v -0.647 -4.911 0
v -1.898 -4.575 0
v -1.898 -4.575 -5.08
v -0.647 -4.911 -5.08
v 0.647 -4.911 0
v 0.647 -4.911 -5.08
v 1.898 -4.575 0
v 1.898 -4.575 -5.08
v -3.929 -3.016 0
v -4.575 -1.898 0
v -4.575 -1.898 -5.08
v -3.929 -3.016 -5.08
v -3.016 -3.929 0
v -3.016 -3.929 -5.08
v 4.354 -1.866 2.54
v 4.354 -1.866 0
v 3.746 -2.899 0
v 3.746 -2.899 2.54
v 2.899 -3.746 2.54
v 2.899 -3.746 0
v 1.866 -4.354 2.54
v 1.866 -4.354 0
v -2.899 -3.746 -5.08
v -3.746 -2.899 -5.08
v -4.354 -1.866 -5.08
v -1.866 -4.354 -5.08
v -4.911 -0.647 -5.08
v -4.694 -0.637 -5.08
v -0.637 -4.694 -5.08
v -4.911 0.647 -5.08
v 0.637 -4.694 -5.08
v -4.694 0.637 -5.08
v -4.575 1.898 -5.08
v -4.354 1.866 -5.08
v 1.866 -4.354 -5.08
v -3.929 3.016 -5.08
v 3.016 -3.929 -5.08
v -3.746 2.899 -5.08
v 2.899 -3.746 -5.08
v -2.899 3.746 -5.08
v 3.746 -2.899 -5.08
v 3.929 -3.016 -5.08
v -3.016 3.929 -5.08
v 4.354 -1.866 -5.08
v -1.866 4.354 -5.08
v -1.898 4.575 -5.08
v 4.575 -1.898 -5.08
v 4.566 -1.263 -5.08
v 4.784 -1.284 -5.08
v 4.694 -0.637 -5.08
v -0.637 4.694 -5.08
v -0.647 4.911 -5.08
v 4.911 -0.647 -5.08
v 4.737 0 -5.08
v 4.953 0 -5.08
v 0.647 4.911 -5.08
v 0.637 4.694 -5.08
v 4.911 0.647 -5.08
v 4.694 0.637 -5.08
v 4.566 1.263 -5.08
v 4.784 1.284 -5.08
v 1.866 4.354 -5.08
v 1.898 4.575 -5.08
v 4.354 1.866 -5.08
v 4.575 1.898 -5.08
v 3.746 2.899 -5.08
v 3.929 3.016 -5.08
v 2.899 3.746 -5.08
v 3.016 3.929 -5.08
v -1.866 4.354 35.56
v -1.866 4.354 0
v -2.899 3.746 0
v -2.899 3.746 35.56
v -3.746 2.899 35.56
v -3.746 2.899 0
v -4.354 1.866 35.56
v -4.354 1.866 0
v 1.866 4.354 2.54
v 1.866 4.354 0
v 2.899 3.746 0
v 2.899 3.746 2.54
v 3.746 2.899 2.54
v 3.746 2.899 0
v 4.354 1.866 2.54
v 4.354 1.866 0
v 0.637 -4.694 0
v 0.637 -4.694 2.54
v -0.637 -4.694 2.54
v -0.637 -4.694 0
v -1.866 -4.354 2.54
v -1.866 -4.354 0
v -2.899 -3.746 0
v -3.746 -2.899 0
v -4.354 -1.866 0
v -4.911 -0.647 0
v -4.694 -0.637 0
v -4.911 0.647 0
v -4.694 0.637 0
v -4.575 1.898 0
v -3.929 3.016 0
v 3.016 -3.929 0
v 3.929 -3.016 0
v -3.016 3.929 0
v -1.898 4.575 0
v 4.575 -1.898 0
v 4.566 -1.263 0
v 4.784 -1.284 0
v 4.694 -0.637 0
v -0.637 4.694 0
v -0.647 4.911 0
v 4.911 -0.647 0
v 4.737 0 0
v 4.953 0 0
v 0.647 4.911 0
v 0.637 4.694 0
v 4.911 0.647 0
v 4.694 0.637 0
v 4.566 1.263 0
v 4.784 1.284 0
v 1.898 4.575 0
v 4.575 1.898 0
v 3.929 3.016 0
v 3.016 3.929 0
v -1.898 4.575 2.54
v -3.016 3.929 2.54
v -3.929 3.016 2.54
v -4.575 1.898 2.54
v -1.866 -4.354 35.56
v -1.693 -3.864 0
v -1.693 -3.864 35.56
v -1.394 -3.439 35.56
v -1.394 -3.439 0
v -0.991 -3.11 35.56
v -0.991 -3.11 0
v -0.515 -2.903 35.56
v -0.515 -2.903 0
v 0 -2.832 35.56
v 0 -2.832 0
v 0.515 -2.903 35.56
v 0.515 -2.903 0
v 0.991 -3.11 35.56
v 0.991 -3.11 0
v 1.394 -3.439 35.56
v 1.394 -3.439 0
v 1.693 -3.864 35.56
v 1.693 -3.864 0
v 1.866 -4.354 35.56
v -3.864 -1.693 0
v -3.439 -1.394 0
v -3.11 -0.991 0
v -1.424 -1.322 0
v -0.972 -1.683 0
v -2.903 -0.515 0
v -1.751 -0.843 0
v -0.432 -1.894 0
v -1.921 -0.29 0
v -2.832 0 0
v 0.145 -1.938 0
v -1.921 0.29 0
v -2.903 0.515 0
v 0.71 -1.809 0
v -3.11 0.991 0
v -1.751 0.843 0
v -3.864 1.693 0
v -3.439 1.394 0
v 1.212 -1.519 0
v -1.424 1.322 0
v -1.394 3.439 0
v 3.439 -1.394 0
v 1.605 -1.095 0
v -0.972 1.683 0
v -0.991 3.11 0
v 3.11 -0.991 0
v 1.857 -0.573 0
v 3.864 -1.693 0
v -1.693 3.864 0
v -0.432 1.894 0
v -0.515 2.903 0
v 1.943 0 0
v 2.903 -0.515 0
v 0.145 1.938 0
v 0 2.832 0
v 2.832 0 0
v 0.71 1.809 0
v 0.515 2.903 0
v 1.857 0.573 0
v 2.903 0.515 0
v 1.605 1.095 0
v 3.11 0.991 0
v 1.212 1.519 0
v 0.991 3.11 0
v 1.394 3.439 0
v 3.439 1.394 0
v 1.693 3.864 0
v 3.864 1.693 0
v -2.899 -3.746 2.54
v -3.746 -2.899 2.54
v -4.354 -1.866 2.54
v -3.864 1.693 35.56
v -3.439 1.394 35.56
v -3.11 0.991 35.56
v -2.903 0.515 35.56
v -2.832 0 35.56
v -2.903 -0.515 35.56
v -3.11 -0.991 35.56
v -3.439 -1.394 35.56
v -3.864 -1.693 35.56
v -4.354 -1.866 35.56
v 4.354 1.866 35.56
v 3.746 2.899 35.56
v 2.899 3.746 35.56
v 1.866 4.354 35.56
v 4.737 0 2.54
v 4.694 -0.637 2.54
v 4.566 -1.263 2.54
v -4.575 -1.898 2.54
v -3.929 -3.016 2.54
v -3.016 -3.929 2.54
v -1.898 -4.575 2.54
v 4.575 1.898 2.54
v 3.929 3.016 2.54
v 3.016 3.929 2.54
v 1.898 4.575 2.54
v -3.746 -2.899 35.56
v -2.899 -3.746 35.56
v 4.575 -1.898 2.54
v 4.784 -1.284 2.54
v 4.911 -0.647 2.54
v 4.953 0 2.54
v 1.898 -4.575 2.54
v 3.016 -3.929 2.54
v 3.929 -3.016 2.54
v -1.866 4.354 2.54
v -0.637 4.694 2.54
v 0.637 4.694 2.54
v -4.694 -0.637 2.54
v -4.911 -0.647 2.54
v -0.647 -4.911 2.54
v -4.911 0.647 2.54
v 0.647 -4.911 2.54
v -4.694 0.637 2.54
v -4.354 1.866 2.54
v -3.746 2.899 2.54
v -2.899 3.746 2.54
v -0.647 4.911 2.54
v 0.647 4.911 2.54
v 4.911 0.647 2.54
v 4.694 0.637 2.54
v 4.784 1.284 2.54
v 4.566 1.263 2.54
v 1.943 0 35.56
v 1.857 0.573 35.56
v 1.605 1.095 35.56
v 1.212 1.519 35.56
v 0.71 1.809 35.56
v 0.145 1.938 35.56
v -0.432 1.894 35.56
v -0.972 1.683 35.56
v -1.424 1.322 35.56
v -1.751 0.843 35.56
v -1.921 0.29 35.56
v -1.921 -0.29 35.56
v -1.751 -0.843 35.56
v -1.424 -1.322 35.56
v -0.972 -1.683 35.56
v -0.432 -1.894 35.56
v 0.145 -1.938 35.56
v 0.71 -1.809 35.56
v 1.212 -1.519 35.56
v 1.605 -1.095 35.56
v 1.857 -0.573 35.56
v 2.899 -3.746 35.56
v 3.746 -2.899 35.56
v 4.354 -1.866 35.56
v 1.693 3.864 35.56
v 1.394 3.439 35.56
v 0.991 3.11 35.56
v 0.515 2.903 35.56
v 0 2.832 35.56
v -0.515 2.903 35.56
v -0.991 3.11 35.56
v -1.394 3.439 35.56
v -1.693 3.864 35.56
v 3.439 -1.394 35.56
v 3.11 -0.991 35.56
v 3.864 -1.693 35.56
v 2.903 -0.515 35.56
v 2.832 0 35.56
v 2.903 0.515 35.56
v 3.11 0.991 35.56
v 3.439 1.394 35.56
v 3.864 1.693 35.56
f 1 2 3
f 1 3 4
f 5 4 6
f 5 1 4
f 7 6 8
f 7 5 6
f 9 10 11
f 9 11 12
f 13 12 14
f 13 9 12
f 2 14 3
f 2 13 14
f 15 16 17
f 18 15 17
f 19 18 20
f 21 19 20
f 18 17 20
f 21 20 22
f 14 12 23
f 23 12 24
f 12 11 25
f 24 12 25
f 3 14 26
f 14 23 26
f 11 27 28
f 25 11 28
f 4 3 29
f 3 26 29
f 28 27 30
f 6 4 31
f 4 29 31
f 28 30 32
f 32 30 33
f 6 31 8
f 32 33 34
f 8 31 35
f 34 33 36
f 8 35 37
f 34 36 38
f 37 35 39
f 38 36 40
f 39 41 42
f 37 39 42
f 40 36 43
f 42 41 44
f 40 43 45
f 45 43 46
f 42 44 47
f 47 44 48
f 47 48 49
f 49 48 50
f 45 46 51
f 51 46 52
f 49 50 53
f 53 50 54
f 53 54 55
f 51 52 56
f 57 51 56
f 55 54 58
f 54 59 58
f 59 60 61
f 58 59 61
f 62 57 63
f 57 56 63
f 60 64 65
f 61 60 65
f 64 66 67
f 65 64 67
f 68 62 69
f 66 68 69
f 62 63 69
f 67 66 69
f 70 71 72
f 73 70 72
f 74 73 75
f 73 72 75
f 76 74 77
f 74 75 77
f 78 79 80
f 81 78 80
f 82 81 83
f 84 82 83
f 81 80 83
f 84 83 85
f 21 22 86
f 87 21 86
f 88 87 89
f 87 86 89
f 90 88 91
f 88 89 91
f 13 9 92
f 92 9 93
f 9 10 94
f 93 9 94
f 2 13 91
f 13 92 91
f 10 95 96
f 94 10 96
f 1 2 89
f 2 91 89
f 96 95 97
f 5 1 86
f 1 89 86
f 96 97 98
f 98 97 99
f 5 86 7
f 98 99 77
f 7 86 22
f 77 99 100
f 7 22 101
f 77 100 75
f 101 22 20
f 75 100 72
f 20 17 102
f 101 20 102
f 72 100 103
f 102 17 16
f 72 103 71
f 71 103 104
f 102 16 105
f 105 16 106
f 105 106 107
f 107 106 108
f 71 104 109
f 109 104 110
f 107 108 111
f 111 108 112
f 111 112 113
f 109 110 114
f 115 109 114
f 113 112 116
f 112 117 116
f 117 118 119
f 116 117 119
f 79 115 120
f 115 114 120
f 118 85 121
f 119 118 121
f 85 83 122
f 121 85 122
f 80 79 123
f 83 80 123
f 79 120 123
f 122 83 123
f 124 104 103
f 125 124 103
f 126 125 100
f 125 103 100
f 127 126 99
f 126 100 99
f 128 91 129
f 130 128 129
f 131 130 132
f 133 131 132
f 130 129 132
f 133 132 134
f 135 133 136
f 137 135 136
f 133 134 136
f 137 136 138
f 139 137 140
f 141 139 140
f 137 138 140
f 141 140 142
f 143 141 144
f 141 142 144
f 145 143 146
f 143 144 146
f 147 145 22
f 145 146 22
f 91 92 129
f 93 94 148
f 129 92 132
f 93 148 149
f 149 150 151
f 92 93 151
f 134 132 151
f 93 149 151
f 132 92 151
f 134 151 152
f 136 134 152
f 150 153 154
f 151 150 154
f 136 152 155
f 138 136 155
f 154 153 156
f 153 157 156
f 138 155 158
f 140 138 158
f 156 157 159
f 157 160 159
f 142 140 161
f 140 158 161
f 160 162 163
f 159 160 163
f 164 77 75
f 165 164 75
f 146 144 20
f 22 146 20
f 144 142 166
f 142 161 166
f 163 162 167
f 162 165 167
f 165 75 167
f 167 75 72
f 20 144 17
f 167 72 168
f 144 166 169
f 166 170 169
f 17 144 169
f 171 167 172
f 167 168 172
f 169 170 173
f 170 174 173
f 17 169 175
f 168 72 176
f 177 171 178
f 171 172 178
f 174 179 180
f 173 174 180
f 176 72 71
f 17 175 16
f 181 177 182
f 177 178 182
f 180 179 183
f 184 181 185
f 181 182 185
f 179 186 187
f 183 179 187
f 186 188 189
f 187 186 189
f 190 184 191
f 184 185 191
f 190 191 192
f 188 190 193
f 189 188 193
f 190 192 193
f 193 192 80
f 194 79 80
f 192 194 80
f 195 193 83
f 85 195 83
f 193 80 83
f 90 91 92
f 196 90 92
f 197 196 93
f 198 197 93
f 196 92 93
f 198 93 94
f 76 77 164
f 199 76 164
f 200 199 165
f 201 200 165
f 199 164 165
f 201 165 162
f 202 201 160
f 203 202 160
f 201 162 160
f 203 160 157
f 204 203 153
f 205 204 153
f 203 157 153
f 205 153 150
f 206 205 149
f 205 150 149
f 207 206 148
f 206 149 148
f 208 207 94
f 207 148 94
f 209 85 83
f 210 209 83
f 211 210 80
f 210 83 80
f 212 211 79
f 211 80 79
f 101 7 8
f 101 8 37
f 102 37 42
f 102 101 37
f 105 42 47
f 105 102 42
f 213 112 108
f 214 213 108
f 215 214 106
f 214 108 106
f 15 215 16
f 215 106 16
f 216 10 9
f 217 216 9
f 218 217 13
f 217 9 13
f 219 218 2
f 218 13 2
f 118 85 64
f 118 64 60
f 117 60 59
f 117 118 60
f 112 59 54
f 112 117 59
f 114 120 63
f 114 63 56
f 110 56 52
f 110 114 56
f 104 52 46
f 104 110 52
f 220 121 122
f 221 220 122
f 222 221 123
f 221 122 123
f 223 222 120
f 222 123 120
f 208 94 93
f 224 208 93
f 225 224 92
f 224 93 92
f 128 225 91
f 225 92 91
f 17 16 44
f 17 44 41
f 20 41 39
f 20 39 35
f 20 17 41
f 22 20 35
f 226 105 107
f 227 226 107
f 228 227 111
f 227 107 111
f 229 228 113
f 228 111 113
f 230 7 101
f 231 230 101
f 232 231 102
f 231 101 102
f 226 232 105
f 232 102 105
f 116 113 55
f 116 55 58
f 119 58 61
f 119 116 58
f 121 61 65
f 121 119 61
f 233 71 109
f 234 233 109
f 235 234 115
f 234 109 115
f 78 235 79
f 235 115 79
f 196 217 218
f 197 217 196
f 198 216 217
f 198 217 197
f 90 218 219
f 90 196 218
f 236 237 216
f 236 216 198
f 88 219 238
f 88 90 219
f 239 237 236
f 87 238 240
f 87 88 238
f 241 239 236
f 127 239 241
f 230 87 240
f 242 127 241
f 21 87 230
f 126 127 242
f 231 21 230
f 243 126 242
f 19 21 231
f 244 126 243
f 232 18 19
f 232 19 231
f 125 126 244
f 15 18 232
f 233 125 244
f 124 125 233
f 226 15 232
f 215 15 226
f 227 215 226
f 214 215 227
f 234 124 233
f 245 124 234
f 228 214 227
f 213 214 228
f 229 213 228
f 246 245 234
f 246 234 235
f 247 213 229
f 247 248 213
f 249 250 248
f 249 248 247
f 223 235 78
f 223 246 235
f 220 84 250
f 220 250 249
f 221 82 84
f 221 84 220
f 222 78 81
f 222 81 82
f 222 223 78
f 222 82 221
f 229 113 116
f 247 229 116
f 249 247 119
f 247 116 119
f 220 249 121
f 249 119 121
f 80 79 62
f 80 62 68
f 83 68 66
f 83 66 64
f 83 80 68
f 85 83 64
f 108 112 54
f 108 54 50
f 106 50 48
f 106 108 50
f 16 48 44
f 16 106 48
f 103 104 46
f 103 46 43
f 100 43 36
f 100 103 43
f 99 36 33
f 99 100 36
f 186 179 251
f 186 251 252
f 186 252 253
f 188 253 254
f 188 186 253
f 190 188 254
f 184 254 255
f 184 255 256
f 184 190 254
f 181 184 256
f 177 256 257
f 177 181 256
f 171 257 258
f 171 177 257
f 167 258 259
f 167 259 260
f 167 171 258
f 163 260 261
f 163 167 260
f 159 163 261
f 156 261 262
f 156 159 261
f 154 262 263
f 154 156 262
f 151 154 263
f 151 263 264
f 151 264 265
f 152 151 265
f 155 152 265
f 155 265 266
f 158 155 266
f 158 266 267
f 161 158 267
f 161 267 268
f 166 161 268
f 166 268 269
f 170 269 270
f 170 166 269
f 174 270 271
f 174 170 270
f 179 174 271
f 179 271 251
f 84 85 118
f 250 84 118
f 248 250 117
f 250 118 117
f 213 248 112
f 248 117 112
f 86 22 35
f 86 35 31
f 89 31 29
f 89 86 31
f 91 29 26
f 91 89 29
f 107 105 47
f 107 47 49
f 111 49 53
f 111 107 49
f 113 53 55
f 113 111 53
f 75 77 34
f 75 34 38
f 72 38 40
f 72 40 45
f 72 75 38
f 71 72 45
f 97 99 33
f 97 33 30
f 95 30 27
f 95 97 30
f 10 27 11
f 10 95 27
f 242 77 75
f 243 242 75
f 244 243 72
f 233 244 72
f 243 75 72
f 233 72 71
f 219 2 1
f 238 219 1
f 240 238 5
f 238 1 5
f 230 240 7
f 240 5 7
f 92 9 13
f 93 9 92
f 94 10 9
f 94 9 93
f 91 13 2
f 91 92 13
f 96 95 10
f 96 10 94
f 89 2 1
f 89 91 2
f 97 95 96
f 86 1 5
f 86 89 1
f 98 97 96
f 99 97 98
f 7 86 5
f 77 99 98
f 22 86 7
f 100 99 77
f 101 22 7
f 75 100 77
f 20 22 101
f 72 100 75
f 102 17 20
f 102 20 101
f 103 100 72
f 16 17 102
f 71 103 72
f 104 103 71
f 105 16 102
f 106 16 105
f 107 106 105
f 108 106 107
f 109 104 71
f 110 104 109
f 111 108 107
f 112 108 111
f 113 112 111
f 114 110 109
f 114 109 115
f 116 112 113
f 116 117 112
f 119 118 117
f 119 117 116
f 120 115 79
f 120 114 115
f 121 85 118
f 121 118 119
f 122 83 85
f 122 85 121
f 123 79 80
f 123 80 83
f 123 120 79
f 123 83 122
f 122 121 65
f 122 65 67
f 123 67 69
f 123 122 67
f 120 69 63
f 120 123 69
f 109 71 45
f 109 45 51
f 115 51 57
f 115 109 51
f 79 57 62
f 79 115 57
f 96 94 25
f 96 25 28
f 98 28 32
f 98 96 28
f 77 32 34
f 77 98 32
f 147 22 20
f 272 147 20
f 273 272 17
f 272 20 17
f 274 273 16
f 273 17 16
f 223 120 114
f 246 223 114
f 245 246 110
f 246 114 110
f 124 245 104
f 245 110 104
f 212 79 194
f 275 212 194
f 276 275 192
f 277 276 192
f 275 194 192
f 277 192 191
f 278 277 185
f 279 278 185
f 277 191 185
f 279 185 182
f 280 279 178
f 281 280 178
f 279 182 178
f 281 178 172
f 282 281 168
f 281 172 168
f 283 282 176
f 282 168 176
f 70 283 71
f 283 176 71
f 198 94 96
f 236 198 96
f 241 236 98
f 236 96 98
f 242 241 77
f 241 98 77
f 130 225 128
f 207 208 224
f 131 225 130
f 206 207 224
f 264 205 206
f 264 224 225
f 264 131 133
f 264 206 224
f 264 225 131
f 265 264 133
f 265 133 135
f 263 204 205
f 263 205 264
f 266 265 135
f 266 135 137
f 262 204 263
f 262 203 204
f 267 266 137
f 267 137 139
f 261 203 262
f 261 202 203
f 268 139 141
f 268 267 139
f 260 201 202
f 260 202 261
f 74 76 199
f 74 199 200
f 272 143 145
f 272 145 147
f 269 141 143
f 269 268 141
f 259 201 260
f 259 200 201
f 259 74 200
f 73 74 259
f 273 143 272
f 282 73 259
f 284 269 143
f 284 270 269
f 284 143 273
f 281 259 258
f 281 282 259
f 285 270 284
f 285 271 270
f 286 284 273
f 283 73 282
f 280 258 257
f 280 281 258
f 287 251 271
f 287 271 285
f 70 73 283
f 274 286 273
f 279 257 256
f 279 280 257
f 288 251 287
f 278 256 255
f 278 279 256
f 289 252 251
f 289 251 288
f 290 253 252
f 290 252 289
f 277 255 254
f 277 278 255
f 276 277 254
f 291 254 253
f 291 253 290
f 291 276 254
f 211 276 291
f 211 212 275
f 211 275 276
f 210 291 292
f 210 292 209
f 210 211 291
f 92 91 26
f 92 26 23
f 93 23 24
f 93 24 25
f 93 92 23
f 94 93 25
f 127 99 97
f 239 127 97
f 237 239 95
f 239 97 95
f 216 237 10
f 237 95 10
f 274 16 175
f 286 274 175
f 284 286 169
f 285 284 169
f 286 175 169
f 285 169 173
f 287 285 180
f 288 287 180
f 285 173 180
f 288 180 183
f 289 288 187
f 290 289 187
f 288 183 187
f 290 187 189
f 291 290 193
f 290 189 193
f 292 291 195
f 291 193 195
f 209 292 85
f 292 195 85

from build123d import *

# Parameters (mm, degrees)
F1_DEPTH = 5.08
F0_R     = 1.9431
F2_DEPTH = 35.56
F3_DEPTH = 2.54


with BuildPart() as f1:
    # F0 (on Top) → F1 (new body)
    with BuildSketch(Plane.XY):
        with BuildLine():
            ThreePointArc((4.5748770777, -1.8980802732), (4.8575495451, -0.9676886984), (4.953, 0))
            ThreePointArc((4.953, 0), (4.8575495451, 0.9676886984), (4.5748770777, 1.8980802732))
            ThreePointArc((4.5748770777, 1.8980802732), (4.4639983721, 1.8853223864), (4.3540571046, 1.8660930149))
            ThreePointArc((4.3540571046, 1.8660930149), (4.640351297, 0.9525), (4.7371, 0))
            ThreePointArc((4.7371, 0), (4.640351297, -0.9525), (4.3540571046, -1.8660930149))
            ThreePointArc((4.3540571046, -1.8660930149), (4.4639983721, -1.8853223864), (4.5748770777, -1.8980802732))
        make_face()
        with BuildLine():
            ThreePointArc((4.3540571046, 1.8660930149), (4.4639983721, 1.8853223864), (4.5748770777, 1.8980802732))
            ThreePointArc((4.5748770777, 1.8980802732), (3.5022998872, 3.5022998872), (1.8980802732, 4.5748770777))
            ThreePointArc((1.8980802732, 4.5748770777), (1.8853223864, 4.4639983721), (1.8660930149, 4.3540571046))
            ThreePointArc((1.8660930149, 4.3540571046), (3.3496355332, 3.3496355332), (4.3540571046, 1.8660930149))
        make_face()
        with BuildLine():
            ThreePointArc((1.8980802732, -4.5748770777), (3.5022998872, -3.5022998872), (4.5748770777, -1.8980802732))
            ThreePointArc((4.5748770777, -1.8980802732), (4.4639983721, -1.8853223864), (4.3540571046, -1.8660930149))
            ThreePointArc((4.3540571046, -1.8660930149), (3.3496355332, -3.3496355332), (1.8660930149, -4.3540571046))
            ThreePointArc((1.8660930149, -4.3540571046), (1.8853223864, -4.4639983721), (1.8980802732, -4.5748770777))
        make_face()
        with BuildLine():
            ThreePointArc((1.8660930149, 4.3540571046), (1.8853223864, 4.4639983721), (1.8980802732, 4.5748770777))
            ThreePointArc((1.8980802732, 4.5748770777), (0, 4.953), (-1.8980802732, 4.5748770777))
            ThreePointArc((-1.8980802732, 4.5748770777), (-1.8853223864, 4.4639983721), (-1.8660930149, 4.3540571046))
            ThreePointArc((-1.8660930149, 4.3540571046), (0, 4.7371), (1.8660930149, 4.3540571046))
        make_face()
        with BuildLine():
            ThreePointArc((-1.8980802732, -4.5748770777), (0, -4.953), (1.8980802732, -4.5748770777))
            ThreePointArc((1.8980802732, -4.5748770777), (1.8853223864, -4.4639983721), (1.8660930149, -4.3540571046))
            ThreePointArc((1.8660930149, -4.3540571046), (0, -4.7371), (-1.8660930149, -4.3540571046))
            ThreePointArc((-1.8660930149, -4.3540571046), (-1.8853223864, -4.4639983721), (-1.8980802732, -4.5748770777))
        make_face()
        with BuildLine():
            ThreePointArc((-1.8660930149, 4.3540571046), (-1.8853223864, 4.4639983721), (-1.8980802732, 4.5748770777))
            ThreePointArc((-1.8980802732, 4.5748770777), (-3.5022998872, 3.5022998872), (-4.5748770777, 1.8980802732))
            ThreePointArc((-4.5748770777, 1.8980802732), (-4.4639983721, 1.8853223864), (-4.3540571046, 1.8660930149))
            ThreePointArc((-4.3540571046, 1.8660930149), (-3.3496355332, 3.3496355332), (-1.8660930149, 4.3540571046))
        make_face()
        with BuildLine():
            ThreePointArc((-4.5748770777, -1.8980802732), (-3.5022998872, -3.5022998872), (-1.8980802732, -4.5748770777))
            ThreePointArc((-1.8980802732, -4.5748770777), (-1.8853223864, -4.4639983721), (-1.8660930149, -4.3540571046))
            ThreePointArc((-1.8660930149, -4.3540571046), (-3.3496355332, -3.3496355332), (-4.3540571046, -1.8660930149))
            ThreePointArc((-4.3540571046, -1.8660930149), (-4.4639983721, -1.8853223864), (-4.5748770777, -1.8980802732))
        make_face()
        with BuildLine():
            ThreePointArc((-4.3540571046, 1.8660930149), (-4.4639983721, 1.8853223864), (-4.5748770777, 1.8980802732))
            ThreePointArc((-4.5748770777, 1.8980802732), (-4.953, 0), (-4.5748770777, -1.8980802732))
            ThreePointArc((-4.5748770777, -1.8980802732), (-4.4639983721, -1.8853223864), (-4.3540571046, -1.8660930149))
            ThreePointArc((-4.3540571046, -1.8660930149), (-4.7371, 0), (-4.3540571046, 1.8660930149))
        make_face()
    extrude(amount=-F1_DEPTH)


with BuildPart() as f2:
    # F0 (on Top) → F2 (new body)
    with BuildSketch(Plane.XY):
        with BuildLine():
            ThreePointArc((4.3540571046, -1.8660930149), (2.8321, 0), (4.3540571046, 1.8660930149))
            ThreePointArc((4.3540571046, 1.8660930149), (3.3496355332, 3.3496355332), (1.8660930149, 4.3540571046))
            ThreePointArc((1.8660930149, 4.3540571046), (0, 2.8321), (-1.8660930149, 4.3540571046))
            ThreePointArc((-1.8660930149, 4.3540571046), (-3.3496355332, 3.3496355332), (-4.3540571046, 1.8660930149))
            ThreePointArc((-4.3540571046, 1.8660930149), (-2.8321, 0), (-4.3540571046, -1.8660930149))
            ThreePointArc((-4.3540571046, -1.8660930149), (-3.3496355332, -3.3496355332), (-1.8660930149, -4.3540571046))
            ThreePointArc((-1.8660930149, -4.3540571046), (0, -2.8321), (1.8660930149, -4.3540571046))
            ThreePointArc((1.8660930149, -4.3540571046), (3.3496355332, -3.3496355332), (4.3540571046, -1.8660930149))
        make_face()
        Circle(F0_R, mode=Mode.SUBTRACT)
    extrude(amount=F2_DEPTH)


with BuildPart() as f3:
    # F0 (on Top) → F3 (new body)
    with BuildSketch(Plane.XY):
        with BuildLine():
            ThreePointArc((4.5748770777, -1.8980802732), (4.8575495451, -0.9676886984), (4.953, 0))
            ThreePointArc((4.953, 0), (4.8575495451, 0.9676886984), (4.5748770777, 1.8980802732))
            ThreePointArc((4.5748770777, 1.8980802732), (4.4639983721, 1.8853223864), (4.3540571046, 1.8660930149))
            ThreePointArc((4.3540571046, 1.8660930149), (4.640351297, 0.9525), (4.7371, 0))
            ThreePointArc((4.7371, 0), (4.640351297, -0.9525), (4.3540571046, -1.8660930149))
            ThreePointArc((4.3540571046, -1.8660930149), (4.4639983721, -1.8853223864), (4.5748770777, -1.8980802732))
        make_face()
        with BuildLine():
            ThreePointArc((4.3540571046, 1.8660930149), (4.4639983721, 1.8853223864), (4.5748770777, 1.8980802732))
            ThreePointArc((4.5748770777, 1.8980802732), (3.5022998872, 3.5022998872), (1.8980802732, 4.5748770777))
            ThreePointArc((1.8980802732, 4.5748770777), (1.8853223864, 4.4639983721), (1.8660930149, 4.3540571046))
            ThreePointArc((1.8660930149, 4.3540571046), (3.3496355332, 3.3496355332), (4.3540571046, 1.8660930149))
        make_face()
        with BuildLine():
            ThreePointArc((1.8980802732, -4.5748770777), (3.5022998872, -3.5022998872), (4.5748770777, -1.8980802732))
            ThreePointArc((4.5748770777, -1.8980802732), (4.4639983721, -1.8853223864), (4.3540571046, -1.8660930149))
            ThreePointArc((4.3540571046, -1.8660930149), (3.3496355332, -3.3496355332), (1.8660930149, -4.3540571046))
            ThreePointArc((1.8660930149, -4.3540571046), (1.8853223864, -4.4639983721), (1.8980802732, -4.5748770777))
        make_face()
        with BuildLine():
            ThreePointArc((1.8660930149, 4.3540571046), (1.8853223864, 4.4639983721), (1.8980802732, 4.5748770777))
            ThreePointArc((1.8980802732, 4.5748770777), (0, 4.953), (-1.8980802732, 4.5748770777))
            ThreePointArc((-1.8980802732, 4.5748770777), (-1.8853223864, 4.4639983721), (-1.8660930149, 4.3540571046))
            ThreePointArc((-1.8660930149, 4.3540571046), (0, 4.7371), (1.8660930149, 4.3540571046))
        make_face()
        with BuildLine():
            ThreePointArc((-1.8980802732, -4.5748770777), (0, -4.953), (1.8980802732, -4.5748770777))
            ThreePointArc((1.8980802732, -4.5748770777), (1.8853223864, -4.4639983721), (1.8660930149, -4.3540571046))
            ThreePointArc((1.8660930149, -4.3540571046), (0, -4.7371), (-1.8660930149, -4.3540571046))
            ThreePointArc((-1.8660930149, -4.3540571046), (-1.8853223864, -4.4639983721), (-1.8980802732, -4.5748770777))
        make_face()
        with BuildLine():
            ThreePointArc((-1.8660930149, 4.3540571046), (-1.8853223864, 4.4639983721), (-1.8980802732, 4.5748770777))
            ThreePointArc((-1.8980802732, 4.5748770777), (-3.5022998872, 3.5022998872), (-4.5748770777, 1.8980802732))
            ThreePointArc((-4.5748770777, 1.8980802732), (-4.4639983721, 1.8853223864), (-4.3540571046, 1.8660930149))
            ThreePointArc((-4.3540571046, 1.8660930149), (-3.3496355332, 3.3496355332), (-1.8660930149, 4.3540571046))
        make_face()
        with BuildLine():
            ThreePointArc((-4.5748770777, -1.8980802732), (-3.5022998872, -3.5022998872), (-1.8980802732, -4.5748770777))
            ThreePointArc((-1.8980802732, -4.5748770777), (-1.8853223864, -4.4639983721), (-1.8660930149, -4.3540571046))
            ThreePointArc((-1.8660930149, -4.3540571046), (-3.3496355332, -3.3496355332), (-4.3540571046, -1.8660930149))
            ThreePointArc((-4.3540571046, -1.8660930149), (-4.4639983721, -1.8853223864), (-4.5748770777, -1.8980802732))
        make_face()
        with BuildLine():
            ThreePointArc((-4.3540571046, 1.8660930149), (-4.4639983721, 1.8853223864), (-4.5748770777, 1.8980802732))
            ThreePointArc((-4.5748770777, 1.8980802732), (-4.953, 0), (-4.5748770777, -1.8980802732))
            ThreePointArc((-4.5748770777, -1.8980802732), (-4.4639983721, -1.8853223864), (-4.3540571046, -1.8660930149))
            ThreePointArc((-4.3540571046, -1.8660930149), (-4.7371, 0), (-4.3540571046, 1.8660930149))
        make_face()
    extrude(amount=F3_DEPTH)


solid = Compound([f1.part, f2.part, f3.part])
